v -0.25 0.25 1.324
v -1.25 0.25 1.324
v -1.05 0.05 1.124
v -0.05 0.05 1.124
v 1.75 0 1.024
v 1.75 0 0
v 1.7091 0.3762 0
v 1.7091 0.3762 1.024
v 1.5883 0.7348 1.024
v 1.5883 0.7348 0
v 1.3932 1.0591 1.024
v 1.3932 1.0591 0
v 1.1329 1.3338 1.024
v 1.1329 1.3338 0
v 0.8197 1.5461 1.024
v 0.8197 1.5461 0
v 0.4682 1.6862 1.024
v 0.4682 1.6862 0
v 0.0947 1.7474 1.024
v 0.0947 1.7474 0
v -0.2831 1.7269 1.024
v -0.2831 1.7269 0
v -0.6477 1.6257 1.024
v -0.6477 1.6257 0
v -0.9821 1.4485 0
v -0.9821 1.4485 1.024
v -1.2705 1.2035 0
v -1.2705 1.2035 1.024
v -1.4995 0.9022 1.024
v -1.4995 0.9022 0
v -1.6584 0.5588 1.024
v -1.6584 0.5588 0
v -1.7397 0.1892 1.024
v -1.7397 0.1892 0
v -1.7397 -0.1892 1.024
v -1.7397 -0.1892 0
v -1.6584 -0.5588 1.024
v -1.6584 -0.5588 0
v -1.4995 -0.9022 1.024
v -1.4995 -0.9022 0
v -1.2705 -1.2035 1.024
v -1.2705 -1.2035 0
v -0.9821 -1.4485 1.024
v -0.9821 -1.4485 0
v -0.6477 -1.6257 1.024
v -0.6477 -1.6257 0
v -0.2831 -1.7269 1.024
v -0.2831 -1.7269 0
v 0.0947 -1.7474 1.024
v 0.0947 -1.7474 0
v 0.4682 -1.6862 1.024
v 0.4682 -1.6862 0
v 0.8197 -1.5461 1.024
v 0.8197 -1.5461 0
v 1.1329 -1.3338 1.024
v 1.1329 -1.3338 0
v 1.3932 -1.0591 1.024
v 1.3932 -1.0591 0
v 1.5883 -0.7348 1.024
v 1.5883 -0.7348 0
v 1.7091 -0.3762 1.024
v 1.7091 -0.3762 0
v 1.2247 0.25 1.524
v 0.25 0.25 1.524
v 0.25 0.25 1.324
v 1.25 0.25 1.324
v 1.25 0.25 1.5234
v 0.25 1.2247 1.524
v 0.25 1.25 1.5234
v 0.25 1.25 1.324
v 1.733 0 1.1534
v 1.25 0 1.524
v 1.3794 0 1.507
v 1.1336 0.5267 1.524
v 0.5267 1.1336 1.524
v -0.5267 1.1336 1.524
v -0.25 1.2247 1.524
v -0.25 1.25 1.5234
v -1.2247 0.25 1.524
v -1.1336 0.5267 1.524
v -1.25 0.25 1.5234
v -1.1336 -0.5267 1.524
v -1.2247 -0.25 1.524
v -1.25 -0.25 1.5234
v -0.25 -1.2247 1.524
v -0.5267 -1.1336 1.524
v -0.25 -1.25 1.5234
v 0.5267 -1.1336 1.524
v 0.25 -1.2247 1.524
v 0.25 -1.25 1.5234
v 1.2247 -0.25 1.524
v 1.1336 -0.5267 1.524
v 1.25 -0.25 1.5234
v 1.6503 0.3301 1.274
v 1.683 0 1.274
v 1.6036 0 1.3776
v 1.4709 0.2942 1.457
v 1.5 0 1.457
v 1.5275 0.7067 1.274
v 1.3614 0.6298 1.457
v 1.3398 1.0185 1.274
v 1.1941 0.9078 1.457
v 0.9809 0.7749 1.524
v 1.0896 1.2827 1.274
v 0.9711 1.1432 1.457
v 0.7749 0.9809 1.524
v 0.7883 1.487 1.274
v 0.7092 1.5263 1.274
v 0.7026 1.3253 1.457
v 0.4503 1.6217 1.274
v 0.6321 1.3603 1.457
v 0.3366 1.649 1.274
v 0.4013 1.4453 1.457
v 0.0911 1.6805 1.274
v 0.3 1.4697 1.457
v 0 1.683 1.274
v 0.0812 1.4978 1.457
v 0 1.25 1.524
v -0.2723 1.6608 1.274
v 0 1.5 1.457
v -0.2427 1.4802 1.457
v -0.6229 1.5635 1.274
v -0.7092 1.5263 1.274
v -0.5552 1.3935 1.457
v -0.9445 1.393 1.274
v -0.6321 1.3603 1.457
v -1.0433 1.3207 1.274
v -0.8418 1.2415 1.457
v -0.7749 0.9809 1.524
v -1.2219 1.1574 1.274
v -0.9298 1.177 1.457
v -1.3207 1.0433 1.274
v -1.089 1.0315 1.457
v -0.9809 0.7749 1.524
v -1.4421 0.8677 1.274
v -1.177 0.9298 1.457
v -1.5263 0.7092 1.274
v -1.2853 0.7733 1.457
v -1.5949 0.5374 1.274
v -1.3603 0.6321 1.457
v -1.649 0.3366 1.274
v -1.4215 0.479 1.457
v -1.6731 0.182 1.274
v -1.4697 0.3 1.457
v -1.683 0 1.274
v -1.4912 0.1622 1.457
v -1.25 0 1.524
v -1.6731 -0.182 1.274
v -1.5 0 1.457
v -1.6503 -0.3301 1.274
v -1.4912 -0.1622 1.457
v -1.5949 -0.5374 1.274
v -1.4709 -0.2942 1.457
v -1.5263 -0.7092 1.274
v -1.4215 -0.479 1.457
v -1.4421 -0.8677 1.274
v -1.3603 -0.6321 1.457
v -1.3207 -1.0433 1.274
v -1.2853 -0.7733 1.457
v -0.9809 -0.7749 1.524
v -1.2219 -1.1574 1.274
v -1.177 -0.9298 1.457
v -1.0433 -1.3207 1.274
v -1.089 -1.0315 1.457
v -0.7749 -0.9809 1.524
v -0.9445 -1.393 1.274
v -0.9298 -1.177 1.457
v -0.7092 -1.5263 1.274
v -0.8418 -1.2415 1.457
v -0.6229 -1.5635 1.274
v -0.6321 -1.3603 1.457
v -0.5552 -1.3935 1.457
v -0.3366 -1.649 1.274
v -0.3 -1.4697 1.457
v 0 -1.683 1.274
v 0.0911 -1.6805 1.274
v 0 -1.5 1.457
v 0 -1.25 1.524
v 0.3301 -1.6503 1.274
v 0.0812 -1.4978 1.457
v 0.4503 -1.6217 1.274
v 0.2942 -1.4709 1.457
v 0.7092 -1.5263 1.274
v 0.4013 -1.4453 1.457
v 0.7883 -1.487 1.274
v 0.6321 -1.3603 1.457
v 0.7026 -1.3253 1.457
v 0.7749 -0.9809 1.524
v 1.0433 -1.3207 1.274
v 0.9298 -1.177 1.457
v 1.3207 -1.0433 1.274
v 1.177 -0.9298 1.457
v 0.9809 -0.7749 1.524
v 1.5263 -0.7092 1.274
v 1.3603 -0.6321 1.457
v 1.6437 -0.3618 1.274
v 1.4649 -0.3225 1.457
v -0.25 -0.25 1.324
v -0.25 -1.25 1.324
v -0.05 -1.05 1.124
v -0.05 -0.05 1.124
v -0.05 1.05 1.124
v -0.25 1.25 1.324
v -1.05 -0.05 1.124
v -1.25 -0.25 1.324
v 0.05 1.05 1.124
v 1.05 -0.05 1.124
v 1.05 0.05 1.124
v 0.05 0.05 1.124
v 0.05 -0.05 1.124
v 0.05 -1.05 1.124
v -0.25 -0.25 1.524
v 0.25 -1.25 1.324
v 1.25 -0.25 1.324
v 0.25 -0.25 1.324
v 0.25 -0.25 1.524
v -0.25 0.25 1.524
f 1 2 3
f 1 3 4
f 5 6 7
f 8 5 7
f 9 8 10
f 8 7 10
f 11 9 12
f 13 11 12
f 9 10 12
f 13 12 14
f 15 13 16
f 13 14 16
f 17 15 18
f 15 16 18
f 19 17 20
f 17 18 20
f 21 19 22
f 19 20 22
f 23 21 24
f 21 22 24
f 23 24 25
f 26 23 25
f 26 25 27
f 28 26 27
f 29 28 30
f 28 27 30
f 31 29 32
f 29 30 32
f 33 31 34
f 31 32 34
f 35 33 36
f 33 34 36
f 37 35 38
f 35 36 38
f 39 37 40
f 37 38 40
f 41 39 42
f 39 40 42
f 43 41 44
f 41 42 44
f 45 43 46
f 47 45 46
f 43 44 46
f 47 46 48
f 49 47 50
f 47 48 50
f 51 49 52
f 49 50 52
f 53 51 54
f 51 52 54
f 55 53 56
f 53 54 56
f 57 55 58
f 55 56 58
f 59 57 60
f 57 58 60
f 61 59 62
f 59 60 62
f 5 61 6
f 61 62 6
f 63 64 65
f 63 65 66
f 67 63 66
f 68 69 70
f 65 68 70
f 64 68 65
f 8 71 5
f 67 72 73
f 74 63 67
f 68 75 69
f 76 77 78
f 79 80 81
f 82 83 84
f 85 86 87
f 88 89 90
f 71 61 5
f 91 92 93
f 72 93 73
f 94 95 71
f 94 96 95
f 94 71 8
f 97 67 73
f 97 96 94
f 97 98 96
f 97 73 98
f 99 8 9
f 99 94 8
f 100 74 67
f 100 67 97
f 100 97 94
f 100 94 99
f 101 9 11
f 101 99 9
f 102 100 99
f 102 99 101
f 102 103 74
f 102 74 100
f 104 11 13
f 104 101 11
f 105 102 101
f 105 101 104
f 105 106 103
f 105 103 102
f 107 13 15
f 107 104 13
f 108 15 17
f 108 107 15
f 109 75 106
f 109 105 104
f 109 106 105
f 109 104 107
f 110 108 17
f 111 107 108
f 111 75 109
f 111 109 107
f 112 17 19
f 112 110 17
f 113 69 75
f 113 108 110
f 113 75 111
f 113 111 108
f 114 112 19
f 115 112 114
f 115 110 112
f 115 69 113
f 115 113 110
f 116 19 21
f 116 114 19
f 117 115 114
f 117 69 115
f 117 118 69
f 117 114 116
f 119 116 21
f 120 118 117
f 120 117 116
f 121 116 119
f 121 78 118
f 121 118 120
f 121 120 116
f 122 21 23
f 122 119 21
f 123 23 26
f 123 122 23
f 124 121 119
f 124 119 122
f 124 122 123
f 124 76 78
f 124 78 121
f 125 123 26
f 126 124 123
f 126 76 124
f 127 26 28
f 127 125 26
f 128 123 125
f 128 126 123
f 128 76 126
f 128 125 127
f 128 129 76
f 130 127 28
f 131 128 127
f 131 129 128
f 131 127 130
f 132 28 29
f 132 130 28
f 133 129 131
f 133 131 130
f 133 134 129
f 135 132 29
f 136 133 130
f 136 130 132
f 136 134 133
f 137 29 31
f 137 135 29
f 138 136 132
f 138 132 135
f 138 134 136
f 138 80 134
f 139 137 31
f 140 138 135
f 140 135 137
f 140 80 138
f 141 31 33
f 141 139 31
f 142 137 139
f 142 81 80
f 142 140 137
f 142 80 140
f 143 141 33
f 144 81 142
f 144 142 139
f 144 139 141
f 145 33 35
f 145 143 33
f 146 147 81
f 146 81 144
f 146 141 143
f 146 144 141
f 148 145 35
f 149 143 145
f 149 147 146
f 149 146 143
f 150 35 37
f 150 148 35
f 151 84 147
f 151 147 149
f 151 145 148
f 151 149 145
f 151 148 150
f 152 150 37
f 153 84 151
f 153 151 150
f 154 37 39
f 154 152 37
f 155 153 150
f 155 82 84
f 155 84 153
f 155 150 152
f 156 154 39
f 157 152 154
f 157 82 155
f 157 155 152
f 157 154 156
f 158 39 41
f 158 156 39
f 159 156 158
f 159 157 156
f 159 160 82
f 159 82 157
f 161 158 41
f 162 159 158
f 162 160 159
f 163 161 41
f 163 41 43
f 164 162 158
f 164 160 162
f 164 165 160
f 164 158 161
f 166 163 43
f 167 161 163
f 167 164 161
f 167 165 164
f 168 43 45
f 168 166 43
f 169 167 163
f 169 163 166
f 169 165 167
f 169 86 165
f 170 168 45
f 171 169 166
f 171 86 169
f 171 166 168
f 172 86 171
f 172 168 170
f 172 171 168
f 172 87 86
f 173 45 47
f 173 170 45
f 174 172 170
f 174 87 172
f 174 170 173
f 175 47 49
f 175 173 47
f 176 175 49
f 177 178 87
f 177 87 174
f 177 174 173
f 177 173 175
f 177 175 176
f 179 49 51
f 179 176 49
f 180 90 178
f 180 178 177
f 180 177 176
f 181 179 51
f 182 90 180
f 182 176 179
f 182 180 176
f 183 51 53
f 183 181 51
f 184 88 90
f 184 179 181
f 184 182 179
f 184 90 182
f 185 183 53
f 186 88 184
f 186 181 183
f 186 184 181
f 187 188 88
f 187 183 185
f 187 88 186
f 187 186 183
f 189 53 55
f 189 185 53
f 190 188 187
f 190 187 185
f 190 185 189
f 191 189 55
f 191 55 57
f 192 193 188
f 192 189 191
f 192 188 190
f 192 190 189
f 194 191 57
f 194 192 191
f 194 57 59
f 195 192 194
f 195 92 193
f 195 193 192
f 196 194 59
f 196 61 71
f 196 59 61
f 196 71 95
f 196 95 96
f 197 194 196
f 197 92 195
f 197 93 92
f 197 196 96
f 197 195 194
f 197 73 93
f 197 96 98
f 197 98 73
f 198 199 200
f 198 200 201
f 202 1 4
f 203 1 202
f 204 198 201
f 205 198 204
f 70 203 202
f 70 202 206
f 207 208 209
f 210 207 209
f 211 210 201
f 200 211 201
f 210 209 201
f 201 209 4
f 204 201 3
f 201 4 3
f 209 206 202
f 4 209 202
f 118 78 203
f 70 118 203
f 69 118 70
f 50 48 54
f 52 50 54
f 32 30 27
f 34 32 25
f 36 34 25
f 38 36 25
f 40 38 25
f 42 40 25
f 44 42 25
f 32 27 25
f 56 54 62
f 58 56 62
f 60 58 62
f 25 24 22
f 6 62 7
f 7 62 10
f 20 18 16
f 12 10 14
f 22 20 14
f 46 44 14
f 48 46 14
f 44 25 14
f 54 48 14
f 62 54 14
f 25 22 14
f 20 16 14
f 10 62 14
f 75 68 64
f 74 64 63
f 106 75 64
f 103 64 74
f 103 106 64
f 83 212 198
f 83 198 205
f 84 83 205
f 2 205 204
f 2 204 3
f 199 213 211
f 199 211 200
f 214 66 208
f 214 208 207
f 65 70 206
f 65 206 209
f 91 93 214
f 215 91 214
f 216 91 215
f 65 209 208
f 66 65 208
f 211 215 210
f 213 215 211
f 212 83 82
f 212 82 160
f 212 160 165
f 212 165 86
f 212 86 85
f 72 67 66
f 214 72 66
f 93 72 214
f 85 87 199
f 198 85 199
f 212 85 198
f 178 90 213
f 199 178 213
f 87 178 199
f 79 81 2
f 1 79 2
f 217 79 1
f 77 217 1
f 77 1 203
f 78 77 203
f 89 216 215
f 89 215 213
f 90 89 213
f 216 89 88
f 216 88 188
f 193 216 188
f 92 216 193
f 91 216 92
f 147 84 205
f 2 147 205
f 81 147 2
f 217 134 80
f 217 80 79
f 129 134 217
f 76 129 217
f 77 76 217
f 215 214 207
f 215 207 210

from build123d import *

# Parameters (mm, degrees)
SKETCH1_R          = 1.75
EXTRUDE1_DEPTH     = 1.524
FILLET1_R          = 0.5
CUT_EXTRUDE2_DEPTH = 0.4
CHAMFER1_SIZE      = 0.2


with BuildPart() as part:
    # Sketch1 → Extrude1 (new body)
    with BuildSketch(Plane.XY):
        Circle(SKETCH1_R)
    extrude(amount=EXTRUDE1_DEPTH)

    # Fillet1
    fillet1_edges = [part.edges().sort_by_distance(p)[0] for p in [
        (-1.75, 0, 1.524),
    ]]
    fillet(fillet1_edges, radius=FILLET1_R)

    # Sketch2 → Cut-Extrude2 (cut)
    with BuildSketch(Plane.XY.offset(1.524)):
        Polygon((0.25, -0.25), (0.25, -1.25), (-0.25, -1.25), (-0.25, -0.25), (-1.25, -0.25), (-1.25, 0.25), (-0.25, 0.25), (-0.25, 1.25), (0.25, 1.25), (0.25, 0.25), (1.25, 0.25), (1.25, -0.25), align=None)
    extrude(amount=-CUT_EXTRUDE2_DEPTH, mode=Mode.SUBTRACT)

    # Chamfer1
    chamfer1_edges = [part.edges().sort_by_distance(p)[0] for p in [
        (0.75, 0.25, 1.124),
        (0.25, -0.75, 1.124),
        (0, -1.25, 1.124),
        (-0.25, -0.75, 1.124),
        (-0.75, -0.25, 1.124),
        (-1.25, 0, 1.124),
        (-0.75, 0.25, 1.124),
        (-0.25, 0.75, 1.124),
        (0, 1.25, 1.124),
        (0.25, 0.75, 1.124),
        (1.25, 0, 1.124),
        (0.75, -0.25, 1.124),
    ]]
    chamfer(chamfer1_edges, length=CHAMFER1_SIZE)


solid = part.part
